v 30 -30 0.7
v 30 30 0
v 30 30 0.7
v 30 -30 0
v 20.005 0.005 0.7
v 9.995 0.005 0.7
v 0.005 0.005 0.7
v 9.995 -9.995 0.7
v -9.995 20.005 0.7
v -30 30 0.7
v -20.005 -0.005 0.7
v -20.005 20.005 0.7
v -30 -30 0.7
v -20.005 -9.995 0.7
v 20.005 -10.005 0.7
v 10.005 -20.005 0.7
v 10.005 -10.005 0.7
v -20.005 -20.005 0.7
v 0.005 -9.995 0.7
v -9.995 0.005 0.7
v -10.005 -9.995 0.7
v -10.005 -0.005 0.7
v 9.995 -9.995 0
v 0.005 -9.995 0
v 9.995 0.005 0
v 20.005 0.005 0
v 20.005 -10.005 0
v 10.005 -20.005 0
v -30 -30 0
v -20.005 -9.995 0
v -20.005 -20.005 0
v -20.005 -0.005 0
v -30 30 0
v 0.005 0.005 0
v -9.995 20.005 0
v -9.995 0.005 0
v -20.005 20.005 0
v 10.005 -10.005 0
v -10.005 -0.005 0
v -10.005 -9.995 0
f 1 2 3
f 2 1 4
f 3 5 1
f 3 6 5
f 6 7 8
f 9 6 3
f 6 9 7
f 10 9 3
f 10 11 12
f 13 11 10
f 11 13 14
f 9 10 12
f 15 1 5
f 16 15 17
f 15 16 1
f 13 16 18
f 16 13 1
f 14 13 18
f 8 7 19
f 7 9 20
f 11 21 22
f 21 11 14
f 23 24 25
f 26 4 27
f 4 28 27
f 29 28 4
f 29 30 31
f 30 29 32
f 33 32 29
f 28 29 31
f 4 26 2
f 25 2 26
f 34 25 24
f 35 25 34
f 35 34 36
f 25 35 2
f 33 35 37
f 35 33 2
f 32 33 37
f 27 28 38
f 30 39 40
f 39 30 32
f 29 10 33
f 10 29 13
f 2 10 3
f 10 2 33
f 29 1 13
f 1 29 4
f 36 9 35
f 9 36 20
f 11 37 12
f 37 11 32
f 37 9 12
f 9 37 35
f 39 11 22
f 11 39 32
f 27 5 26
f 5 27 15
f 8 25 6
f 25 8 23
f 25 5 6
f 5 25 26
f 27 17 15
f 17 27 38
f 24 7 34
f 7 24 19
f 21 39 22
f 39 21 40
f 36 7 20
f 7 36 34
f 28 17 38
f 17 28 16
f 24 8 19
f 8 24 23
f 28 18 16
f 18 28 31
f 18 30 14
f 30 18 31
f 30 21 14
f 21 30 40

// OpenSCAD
difference()
{
  translate([0, 0, 0.35]) cube([60, 60, 0.7], center=true);
  translate([-15.0, 15.0, 0]) cube([10.01, 10.01, 3.5], center=true);
  translate([-15.0, 5.0, 0]) cube([10.01, 10.01, 3.5], center=true);
  translate([15.0, -5.0, 0]) cube([10.01, 10.01, 3.5], center=true);
  translate([-5.0, -5.0, 0]) cube([10.01, 10.01, 3.5], center=true);
  translate([5.0, -15.0, 0]) cube([10.01, 10.01, 3.5], center=true);
  translate([-5.0, -15.0, 0]) cube([10.01, 10.01, 3.5], center=true);
  translate([-15.0, -15.0, 0]) cube([10.01, 10.01, 3.5], center=true);
}
